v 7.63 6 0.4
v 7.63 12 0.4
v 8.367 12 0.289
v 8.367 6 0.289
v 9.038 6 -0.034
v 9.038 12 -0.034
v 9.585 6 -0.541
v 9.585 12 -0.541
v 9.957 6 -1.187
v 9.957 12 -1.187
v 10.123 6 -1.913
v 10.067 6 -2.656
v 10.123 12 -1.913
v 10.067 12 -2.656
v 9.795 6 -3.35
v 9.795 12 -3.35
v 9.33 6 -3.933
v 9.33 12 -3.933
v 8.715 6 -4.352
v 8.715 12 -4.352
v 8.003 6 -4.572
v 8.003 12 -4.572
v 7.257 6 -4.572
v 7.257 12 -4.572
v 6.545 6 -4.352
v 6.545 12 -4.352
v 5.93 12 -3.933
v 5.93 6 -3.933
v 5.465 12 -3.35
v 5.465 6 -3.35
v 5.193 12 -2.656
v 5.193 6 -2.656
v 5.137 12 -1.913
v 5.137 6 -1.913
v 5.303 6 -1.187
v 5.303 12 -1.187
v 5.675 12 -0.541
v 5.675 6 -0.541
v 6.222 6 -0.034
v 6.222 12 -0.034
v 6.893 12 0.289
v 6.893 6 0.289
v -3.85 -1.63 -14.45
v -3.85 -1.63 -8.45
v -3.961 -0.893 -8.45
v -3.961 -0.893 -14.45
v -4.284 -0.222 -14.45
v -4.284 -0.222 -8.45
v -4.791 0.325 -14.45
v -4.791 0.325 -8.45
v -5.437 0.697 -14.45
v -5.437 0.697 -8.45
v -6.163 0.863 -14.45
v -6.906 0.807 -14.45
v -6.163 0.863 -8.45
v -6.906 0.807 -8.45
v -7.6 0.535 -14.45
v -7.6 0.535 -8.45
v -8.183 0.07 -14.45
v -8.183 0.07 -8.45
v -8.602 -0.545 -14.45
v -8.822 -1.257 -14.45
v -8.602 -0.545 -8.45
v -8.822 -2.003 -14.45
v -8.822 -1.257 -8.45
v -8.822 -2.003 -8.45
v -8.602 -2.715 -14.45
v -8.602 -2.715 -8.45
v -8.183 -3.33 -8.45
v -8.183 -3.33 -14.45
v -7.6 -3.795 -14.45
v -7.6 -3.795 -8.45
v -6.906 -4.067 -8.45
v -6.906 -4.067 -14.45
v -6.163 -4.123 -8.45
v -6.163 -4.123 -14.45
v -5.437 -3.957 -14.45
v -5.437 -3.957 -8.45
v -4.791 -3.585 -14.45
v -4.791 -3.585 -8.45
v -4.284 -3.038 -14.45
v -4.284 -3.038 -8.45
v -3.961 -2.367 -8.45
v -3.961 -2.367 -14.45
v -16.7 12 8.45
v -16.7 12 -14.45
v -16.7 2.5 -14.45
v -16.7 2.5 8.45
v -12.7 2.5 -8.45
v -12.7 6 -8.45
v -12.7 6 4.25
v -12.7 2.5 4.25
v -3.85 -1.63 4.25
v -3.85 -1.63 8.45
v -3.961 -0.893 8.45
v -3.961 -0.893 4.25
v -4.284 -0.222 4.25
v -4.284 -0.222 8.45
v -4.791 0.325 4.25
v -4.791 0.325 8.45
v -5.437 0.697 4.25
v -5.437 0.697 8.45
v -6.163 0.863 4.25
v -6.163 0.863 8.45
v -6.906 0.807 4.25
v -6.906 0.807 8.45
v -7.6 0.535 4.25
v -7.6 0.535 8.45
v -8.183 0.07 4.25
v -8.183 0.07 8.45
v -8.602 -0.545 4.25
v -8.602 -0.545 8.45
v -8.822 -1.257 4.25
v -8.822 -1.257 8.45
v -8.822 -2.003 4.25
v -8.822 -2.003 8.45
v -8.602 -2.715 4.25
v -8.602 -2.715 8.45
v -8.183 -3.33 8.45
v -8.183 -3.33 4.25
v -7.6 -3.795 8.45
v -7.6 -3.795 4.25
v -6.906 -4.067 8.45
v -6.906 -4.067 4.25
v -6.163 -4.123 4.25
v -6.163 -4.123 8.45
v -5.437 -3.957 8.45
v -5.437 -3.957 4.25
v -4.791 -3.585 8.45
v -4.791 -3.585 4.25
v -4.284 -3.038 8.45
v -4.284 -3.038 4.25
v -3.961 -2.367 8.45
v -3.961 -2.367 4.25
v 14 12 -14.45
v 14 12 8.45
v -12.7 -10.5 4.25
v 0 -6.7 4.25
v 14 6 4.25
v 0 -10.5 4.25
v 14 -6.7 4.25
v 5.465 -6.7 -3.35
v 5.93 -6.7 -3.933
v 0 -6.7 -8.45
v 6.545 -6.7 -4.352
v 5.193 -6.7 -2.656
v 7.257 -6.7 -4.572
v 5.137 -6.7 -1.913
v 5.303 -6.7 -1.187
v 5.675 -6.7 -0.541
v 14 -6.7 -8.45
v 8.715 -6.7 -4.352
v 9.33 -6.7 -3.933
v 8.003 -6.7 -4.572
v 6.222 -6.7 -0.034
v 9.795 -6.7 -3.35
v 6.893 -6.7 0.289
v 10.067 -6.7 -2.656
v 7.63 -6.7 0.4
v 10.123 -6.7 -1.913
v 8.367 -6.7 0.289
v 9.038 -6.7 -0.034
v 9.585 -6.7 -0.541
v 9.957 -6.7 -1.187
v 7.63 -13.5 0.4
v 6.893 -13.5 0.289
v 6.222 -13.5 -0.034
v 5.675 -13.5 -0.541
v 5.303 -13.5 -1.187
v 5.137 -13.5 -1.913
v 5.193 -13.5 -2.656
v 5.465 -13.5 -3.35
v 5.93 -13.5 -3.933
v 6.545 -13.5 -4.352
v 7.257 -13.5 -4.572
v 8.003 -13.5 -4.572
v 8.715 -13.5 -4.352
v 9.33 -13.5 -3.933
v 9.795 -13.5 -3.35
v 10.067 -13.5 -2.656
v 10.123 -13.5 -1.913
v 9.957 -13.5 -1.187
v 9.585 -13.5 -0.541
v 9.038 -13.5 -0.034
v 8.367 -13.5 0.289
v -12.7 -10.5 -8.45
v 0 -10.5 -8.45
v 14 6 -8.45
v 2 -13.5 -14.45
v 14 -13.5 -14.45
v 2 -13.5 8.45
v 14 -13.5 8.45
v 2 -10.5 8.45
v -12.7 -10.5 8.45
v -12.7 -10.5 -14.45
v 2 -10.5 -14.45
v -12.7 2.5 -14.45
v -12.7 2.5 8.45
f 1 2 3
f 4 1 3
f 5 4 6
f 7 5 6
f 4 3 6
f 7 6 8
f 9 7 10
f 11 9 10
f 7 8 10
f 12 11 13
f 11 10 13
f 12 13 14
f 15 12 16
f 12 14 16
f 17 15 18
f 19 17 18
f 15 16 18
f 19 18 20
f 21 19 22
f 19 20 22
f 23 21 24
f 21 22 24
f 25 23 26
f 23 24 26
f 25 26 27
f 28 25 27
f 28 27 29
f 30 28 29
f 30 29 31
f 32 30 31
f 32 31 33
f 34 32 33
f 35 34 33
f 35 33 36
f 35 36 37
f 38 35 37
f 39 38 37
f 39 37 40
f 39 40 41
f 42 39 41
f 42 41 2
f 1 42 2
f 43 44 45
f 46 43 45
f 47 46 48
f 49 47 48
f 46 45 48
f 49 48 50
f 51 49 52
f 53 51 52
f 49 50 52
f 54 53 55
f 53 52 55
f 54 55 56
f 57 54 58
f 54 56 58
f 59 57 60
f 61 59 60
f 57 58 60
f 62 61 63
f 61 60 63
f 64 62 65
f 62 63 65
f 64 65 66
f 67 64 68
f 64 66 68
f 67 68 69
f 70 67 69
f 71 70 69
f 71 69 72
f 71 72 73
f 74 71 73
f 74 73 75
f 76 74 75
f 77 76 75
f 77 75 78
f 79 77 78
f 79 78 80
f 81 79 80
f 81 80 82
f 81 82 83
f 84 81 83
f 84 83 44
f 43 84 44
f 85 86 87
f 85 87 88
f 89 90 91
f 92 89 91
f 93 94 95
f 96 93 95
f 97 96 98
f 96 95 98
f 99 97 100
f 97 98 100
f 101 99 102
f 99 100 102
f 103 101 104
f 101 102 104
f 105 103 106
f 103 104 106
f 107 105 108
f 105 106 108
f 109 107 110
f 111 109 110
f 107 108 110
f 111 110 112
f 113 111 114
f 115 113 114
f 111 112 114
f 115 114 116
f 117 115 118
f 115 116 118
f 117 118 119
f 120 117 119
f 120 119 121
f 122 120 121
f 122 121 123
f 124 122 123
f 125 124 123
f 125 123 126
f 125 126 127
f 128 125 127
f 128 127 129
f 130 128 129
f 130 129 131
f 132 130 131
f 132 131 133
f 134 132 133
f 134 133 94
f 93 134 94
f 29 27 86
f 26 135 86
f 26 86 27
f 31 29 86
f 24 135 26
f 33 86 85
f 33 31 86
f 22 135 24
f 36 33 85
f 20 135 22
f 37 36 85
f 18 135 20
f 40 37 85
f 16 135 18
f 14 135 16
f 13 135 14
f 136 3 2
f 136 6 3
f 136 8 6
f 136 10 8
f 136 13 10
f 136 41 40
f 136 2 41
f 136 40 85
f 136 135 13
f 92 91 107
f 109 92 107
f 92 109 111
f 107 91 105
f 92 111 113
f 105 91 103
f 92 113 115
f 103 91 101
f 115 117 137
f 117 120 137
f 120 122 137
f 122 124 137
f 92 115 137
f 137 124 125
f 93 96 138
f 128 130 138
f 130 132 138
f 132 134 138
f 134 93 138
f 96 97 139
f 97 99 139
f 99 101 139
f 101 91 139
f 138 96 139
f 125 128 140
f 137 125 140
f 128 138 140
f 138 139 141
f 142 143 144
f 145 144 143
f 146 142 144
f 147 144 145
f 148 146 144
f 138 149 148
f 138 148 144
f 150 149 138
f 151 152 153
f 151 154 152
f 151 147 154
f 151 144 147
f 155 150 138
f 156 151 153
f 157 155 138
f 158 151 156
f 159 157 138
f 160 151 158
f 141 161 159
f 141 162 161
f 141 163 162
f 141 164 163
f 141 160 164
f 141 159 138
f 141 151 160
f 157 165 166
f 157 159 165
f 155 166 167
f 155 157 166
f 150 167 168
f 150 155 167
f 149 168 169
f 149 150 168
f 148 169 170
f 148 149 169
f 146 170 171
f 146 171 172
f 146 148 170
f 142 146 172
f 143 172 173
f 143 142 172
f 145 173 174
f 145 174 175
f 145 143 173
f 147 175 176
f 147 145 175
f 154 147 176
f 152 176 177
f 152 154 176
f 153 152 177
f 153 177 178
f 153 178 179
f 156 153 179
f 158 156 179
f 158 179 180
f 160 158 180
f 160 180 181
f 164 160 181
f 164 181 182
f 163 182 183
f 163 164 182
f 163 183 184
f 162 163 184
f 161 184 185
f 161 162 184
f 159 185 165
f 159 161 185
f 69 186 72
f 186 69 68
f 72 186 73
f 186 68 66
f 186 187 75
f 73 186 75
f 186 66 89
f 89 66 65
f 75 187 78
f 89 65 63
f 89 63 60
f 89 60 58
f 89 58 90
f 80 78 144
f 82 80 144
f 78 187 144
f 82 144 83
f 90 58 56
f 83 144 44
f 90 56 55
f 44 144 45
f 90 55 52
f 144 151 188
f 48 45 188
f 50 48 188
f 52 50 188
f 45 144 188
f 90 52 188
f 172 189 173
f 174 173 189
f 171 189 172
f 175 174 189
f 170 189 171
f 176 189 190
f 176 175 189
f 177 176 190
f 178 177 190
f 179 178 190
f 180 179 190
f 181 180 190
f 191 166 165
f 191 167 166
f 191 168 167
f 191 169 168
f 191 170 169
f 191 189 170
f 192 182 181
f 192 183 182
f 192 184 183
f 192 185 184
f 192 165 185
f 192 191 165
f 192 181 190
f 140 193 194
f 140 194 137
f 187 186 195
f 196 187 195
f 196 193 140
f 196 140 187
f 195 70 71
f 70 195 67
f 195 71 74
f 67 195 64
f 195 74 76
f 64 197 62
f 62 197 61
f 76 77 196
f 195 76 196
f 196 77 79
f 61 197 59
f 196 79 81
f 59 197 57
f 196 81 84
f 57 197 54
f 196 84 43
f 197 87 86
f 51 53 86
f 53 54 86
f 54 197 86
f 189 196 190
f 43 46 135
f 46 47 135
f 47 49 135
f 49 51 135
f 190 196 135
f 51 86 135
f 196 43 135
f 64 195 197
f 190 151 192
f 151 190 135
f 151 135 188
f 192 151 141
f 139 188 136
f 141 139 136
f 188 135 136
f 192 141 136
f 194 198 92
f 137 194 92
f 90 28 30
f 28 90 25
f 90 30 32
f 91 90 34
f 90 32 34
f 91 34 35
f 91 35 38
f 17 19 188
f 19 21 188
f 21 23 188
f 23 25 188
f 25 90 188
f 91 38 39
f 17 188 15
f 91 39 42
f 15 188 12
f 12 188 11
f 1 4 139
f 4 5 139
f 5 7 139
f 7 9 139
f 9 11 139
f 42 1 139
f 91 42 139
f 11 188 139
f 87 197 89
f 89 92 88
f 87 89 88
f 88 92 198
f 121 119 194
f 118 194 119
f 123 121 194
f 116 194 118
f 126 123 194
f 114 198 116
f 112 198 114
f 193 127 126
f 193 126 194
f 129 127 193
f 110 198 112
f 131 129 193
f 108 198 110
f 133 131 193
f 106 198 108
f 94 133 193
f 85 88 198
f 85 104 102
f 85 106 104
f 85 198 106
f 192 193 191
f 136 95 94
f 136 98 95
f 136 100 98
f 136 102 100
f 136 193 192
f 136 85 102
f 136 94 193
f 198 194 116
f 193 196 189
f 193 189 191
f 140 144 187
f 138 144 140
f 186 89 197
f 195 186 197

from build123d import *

# Parameters (mm, degrees)
SKETCH1_W               = 16.9
SKETCH1_H               = 24
BOSS_EXTRUDE1_DEPTH     = 17
SKETCH2_W               = 12.7
SKETCH2_H               = 12.7
CUT_EXTRUDE1_DEPTH      = 23.458906919
SKETCH3_R               = 2.5
CUT_EXTRUDE2_DEPTH      = 31.600694437
BOSS_EXTRUDE2_DEPTH     = 12.7
EXTRUDE_3_DEPTH         = 4
EXTRUDE_4_DEPTH         = 4
SKETCH5_R               = 2.5
CUT_EXTRUDE3_DEPTH      = 30.49254143
SKETCH_4_W              = 3
SKETCH_4_H              = 16.9
CUT_EXTRUDE_1_DEPTH     = 32.937477984
SKETCH_5_W              = 12.7
SKETCH_5_H              = 1.5
CUT_EXTRUDE_2_DEPTH     = 30.320641194
CUT_EXTRUDE4_DEPTH      = 25.039394751
CUT_EXTRUDE4_DEPTH_BACK = 2
SKETCH_6_W              = 4
SKETCH_6_H              = 24
CUT_EXTRUDE_3_DEPTH     = 25.039394751
SKETCH_7_W              = 20.9
SKETCH_7_H              = 1.5
CUT_EXTRUDE_4_DEPTH     = 26.469442475
SKETCH_8_W              = 4
SKETCH_8_H              = 22.5
CUT_EXTRUDE_5_DEPTH     = 36.234819426
SKETCH_9_W              = 4
SKETCH_9_H              = 17
CUT_EXTRUDE_6_DEPTH     = 27.617663308
SKETCH_11_W             = 12.7
SKETCH_11_H             = 3.8
EXTRUDE_5_DEPTH         = 2
SKETCH_12_W             = 6
SKETCH_12_H             = 22.5
EXTRUDE_6_DEPTH         = 26.7
SKETCH_21_W             = 22.9
SKETCH_21_H             = 9.5
EXTRUDE_7_DEPTH         = 4
SKETCH_14_R             = 2.5
CUT_EXTRUDE_7_DEPTH     = 31.778239066
SKETCH_22_W             = 12
SKETCH_22_H             = 22.9
SKETCH_22_R             = 2.5
EXTRUDE_8_DEPTH         = 3


with BuildPart() as part:
    # Sketch1 → Boss-Extrude1 (new body)
    with BuildSketch(Plane(origin=(0, 0, 0), x_dir=(0, 0, -1), z_dir=(1, 0, 0))):
        Rectangle(SKETCH1_W, SKETCH1_H)
    extrude(amount=BOSS_EXTRUDE1_DEPTH)

    # Sketch2 → Cut-Extrude1 (cut, through all)
    with BuildSketch(Plane(origin=(17, 0, 0), x_dir=(0, 0, -1), z_dir=(1, 0, 0))):
        with Locations((2.1, -0.35)):
            Rectangle(SKETCH2_W, SKETCH2_H)
    extrude(amount=-CUT_EXTRUDE1_DEPTH, mode=Mode.SUBTRACT)

    # Sketch3 → Cut-Extrude2 (cut, through all)
    with BuildSketch(Plane(origin=(0, 12, 0), x_dir=(1, 0, 0), z_dir=(0, 1, 0))):
        with Locations(Location((7.63, 2.1, 0), (0, 0, 270))):
            Circle(SKETCH3_R)
    extrude(amount=-CUT_EXTRUDE2_DEPTH, mode=Mode.SUBTRACT)

    # Sketch4 → Boss-Extrude2 (add)
    with BuildSketch(Plane.ZY):
        Polygon((-8.45, 12), (-8.45, 6), (4.25, 6), (4.25, -12), (8.45, -12), (8.45, 12), align=None)
    extrude(amount=BOSS_EXTRUDE2_DEPTH)

    # 草图3 → 凸台-拉伸3 (add)
    with BuildSketch(Plane.ZY.offset(12.7)):
        Polygon((8.45, 12), (-7.55, 12), (8.45, -5), align=None)
    extrude(amount=EXTRUDE_3_DEPTH)

    # 草图1 → 凸台-拉伸4 (add)
    with BuildSketch(Plane(origin=(0, 0, -8.45), x_dir=(-1, 0, 0), z_dir=(0, 0, -1))):
        Polygon((12.7, 12), (0, 12), (0, 0.5), (-11.445354581, -12), (1.274949719, -12), (12.7, -12), align=None)
    extrude(amount=EXTRUDE_4_DEPTH)

    # Sketch5 → Cut-Extrude3 (cut, through all)
    with BuildSketch(Plane.XY.offset(8.45)):
        with Locations((-6.35, -1.63)):
            Circle(SKETCH5_R)
    extrude(amount=-CUT_EXTRUDE3_DEPTH, mode=Mode.SUBTRACT)

    # 草图4 → 切除-拉伸1 (cut, through all)
    with BuildSketch(Plane(origin=(0, 12, 0), x_dir=(1, 0, 0), z_dir=(0, 1, 0))):
        with Locations((15.5, 0)):
            Rectangle(SKETCH_4_W, SKETCH_4_H)
    extrude(amount=-CUT_EXTRUDE_1_DEPTH, mode=Mode.SUBTRACT)

    # 草图5 → 切除-拉伸2 (cut, through all)
    with BuildSketch(Plane.XY.offset(8.45)):
        with Locations((-6.35, -11.25)):
            Rectangle(SKETCH_5_W, SKETCH_5_H)
    extrude(amount=-CUT_EXTRUDE_2_DEPTH, mode=Mode.SUBTRACT)

    # Sketch7 → Cut-Extrude4 (cut, two sides: drawn at the far end of the back side and taken through both)
    with BuildSketch(Plane.ZY.offset(-CUT_EXTRUDE4_DEPTH_BACK)):
        Polygon((4.25, -6.7), (-8.45, -6.7), (-8.45, -10.5), (-12.45, -10.5), (-12.45, -12), (8.45, -12), (8.45, -10.5), (4.25, -10.5), align=None)
    extrude(amount=CUT_EXTRUDE4_DEPTH + CUT_EXTRUDE4_DEPTH_BACK, mode=Mode.SUBTRACT)

    # 草图6 → 切除-拉伸3 (cut, through all)
    with BuildSketch(Plane(origin=(0, 0, 0), x_dir=(0, 0, -1), z_dir=(1, 0, 0))):
        with Locations((10.45, 0)):
            Rectangle(SKETCH_6_W, SKETCH_6_H)
    extrude(amount=-CUT_EXTRUDE_3_DEPTH, mode=Mode.SUBTRACT)

    # 草图7 → 切除-拉伸4 (cut, through all)
    with BuildSketch(Plane.ZY.offset(-2)):
        with Locations((-2, -11.25)):
            Rectangle(SKETCH_7_W, SKETCH_7_H)
    extrude(amount=-CUT_EXTRUDE_4_DEPTH, mode=Mode.SUBTRACT)

    # 草图8 → 切除-拉伸5 (cut, through all)
    with BuildSketch(Plane(origin=(14, 0, 0), x_dir=(0, 0, -1), z_dir=(1, 0, 0))):
        with Locations((10.45, 0.75)):
            Rectangle(SKETCH_8_W, SKETCH_8_H)
    extrude(amount=-CUT_EXTRUDE_5_DEPTH, mode=Mode.SUBTRACT)

    # 草图9 → 切除-拉伸6 (cut, through all)
    with BuildSketch(Plane(origin=(0, 0, -8.45), x_dir=(-1, 0, 0), z_dir=(0, 0, -1))):
        with Locations((14.7, 3.5)):
            Rectangle(SKETCH_9_W, SKETCH_9_H)
    extrude(amount=-CUT_EXTRUDE_6_DEPTH, mode=Mode.SUBTRACT)

    # 草图11 → 凸台-拉伸5 (add)
    with BuildSketch(Plane.ZY.offset(-2)):
        with Locations((-2.1, -8.6)):
            Rectangle(SKETCH_11_W, SKETCH_11_H)
    extrude(amount=EXTRUDE_5_DEPTH)

    # 草图12 → 凸台-拉伸6 (add)
    with BuildSketch(Plane(origin=(14, 0, 0), x_dir=(0, 0, -1), z_dir=(1, 0, 0))):
        with Locations((11.45, 0.75)):
            Rectangle(SKETCH_12_W, SKETCH_12_H)
    extrude(amount=-EXTRUDE_6_DEPTH)

    # 草图21 → 凸台-拉伸7 (add)
    with BuildSketch(Plane.ZY.offset(12.7)):
        with Locations((-3, 7.25)):
            Rectangle(SKETCH_21_W, SKETCH_21_H)
    extrude(amount=EXTRUDE_7_DEPTH)

    # 草图14 → 切除-拉伸7 (cut, through all)
    with BuildSketch(Plane.XY.offset(8.45)):
        with Locations((-6.35, -1.63)):
            Circle(SKETCH_14_R)
    extrude(amount=-CUT_EXTRUDE_7_DEPTH, mode=Mode.SUBTRACT)

    # 草图22 → 凸台-拉伸8 (add)
    with BuildSketch(Plane.XZ.offset(10.5)):
        with Locations((8, -3)):
            Rectangle(SKETCH_22_W, SKETCH_22_H)
        with Locations(Location((7.63, -2.1, 0), (0, 0, 90))):
            Circle(SKETCH_22_R, mode=Mode.SUBTRACT)
    extrude(amount=EXTRUDE_8_DEPTH)


solid = part.part
